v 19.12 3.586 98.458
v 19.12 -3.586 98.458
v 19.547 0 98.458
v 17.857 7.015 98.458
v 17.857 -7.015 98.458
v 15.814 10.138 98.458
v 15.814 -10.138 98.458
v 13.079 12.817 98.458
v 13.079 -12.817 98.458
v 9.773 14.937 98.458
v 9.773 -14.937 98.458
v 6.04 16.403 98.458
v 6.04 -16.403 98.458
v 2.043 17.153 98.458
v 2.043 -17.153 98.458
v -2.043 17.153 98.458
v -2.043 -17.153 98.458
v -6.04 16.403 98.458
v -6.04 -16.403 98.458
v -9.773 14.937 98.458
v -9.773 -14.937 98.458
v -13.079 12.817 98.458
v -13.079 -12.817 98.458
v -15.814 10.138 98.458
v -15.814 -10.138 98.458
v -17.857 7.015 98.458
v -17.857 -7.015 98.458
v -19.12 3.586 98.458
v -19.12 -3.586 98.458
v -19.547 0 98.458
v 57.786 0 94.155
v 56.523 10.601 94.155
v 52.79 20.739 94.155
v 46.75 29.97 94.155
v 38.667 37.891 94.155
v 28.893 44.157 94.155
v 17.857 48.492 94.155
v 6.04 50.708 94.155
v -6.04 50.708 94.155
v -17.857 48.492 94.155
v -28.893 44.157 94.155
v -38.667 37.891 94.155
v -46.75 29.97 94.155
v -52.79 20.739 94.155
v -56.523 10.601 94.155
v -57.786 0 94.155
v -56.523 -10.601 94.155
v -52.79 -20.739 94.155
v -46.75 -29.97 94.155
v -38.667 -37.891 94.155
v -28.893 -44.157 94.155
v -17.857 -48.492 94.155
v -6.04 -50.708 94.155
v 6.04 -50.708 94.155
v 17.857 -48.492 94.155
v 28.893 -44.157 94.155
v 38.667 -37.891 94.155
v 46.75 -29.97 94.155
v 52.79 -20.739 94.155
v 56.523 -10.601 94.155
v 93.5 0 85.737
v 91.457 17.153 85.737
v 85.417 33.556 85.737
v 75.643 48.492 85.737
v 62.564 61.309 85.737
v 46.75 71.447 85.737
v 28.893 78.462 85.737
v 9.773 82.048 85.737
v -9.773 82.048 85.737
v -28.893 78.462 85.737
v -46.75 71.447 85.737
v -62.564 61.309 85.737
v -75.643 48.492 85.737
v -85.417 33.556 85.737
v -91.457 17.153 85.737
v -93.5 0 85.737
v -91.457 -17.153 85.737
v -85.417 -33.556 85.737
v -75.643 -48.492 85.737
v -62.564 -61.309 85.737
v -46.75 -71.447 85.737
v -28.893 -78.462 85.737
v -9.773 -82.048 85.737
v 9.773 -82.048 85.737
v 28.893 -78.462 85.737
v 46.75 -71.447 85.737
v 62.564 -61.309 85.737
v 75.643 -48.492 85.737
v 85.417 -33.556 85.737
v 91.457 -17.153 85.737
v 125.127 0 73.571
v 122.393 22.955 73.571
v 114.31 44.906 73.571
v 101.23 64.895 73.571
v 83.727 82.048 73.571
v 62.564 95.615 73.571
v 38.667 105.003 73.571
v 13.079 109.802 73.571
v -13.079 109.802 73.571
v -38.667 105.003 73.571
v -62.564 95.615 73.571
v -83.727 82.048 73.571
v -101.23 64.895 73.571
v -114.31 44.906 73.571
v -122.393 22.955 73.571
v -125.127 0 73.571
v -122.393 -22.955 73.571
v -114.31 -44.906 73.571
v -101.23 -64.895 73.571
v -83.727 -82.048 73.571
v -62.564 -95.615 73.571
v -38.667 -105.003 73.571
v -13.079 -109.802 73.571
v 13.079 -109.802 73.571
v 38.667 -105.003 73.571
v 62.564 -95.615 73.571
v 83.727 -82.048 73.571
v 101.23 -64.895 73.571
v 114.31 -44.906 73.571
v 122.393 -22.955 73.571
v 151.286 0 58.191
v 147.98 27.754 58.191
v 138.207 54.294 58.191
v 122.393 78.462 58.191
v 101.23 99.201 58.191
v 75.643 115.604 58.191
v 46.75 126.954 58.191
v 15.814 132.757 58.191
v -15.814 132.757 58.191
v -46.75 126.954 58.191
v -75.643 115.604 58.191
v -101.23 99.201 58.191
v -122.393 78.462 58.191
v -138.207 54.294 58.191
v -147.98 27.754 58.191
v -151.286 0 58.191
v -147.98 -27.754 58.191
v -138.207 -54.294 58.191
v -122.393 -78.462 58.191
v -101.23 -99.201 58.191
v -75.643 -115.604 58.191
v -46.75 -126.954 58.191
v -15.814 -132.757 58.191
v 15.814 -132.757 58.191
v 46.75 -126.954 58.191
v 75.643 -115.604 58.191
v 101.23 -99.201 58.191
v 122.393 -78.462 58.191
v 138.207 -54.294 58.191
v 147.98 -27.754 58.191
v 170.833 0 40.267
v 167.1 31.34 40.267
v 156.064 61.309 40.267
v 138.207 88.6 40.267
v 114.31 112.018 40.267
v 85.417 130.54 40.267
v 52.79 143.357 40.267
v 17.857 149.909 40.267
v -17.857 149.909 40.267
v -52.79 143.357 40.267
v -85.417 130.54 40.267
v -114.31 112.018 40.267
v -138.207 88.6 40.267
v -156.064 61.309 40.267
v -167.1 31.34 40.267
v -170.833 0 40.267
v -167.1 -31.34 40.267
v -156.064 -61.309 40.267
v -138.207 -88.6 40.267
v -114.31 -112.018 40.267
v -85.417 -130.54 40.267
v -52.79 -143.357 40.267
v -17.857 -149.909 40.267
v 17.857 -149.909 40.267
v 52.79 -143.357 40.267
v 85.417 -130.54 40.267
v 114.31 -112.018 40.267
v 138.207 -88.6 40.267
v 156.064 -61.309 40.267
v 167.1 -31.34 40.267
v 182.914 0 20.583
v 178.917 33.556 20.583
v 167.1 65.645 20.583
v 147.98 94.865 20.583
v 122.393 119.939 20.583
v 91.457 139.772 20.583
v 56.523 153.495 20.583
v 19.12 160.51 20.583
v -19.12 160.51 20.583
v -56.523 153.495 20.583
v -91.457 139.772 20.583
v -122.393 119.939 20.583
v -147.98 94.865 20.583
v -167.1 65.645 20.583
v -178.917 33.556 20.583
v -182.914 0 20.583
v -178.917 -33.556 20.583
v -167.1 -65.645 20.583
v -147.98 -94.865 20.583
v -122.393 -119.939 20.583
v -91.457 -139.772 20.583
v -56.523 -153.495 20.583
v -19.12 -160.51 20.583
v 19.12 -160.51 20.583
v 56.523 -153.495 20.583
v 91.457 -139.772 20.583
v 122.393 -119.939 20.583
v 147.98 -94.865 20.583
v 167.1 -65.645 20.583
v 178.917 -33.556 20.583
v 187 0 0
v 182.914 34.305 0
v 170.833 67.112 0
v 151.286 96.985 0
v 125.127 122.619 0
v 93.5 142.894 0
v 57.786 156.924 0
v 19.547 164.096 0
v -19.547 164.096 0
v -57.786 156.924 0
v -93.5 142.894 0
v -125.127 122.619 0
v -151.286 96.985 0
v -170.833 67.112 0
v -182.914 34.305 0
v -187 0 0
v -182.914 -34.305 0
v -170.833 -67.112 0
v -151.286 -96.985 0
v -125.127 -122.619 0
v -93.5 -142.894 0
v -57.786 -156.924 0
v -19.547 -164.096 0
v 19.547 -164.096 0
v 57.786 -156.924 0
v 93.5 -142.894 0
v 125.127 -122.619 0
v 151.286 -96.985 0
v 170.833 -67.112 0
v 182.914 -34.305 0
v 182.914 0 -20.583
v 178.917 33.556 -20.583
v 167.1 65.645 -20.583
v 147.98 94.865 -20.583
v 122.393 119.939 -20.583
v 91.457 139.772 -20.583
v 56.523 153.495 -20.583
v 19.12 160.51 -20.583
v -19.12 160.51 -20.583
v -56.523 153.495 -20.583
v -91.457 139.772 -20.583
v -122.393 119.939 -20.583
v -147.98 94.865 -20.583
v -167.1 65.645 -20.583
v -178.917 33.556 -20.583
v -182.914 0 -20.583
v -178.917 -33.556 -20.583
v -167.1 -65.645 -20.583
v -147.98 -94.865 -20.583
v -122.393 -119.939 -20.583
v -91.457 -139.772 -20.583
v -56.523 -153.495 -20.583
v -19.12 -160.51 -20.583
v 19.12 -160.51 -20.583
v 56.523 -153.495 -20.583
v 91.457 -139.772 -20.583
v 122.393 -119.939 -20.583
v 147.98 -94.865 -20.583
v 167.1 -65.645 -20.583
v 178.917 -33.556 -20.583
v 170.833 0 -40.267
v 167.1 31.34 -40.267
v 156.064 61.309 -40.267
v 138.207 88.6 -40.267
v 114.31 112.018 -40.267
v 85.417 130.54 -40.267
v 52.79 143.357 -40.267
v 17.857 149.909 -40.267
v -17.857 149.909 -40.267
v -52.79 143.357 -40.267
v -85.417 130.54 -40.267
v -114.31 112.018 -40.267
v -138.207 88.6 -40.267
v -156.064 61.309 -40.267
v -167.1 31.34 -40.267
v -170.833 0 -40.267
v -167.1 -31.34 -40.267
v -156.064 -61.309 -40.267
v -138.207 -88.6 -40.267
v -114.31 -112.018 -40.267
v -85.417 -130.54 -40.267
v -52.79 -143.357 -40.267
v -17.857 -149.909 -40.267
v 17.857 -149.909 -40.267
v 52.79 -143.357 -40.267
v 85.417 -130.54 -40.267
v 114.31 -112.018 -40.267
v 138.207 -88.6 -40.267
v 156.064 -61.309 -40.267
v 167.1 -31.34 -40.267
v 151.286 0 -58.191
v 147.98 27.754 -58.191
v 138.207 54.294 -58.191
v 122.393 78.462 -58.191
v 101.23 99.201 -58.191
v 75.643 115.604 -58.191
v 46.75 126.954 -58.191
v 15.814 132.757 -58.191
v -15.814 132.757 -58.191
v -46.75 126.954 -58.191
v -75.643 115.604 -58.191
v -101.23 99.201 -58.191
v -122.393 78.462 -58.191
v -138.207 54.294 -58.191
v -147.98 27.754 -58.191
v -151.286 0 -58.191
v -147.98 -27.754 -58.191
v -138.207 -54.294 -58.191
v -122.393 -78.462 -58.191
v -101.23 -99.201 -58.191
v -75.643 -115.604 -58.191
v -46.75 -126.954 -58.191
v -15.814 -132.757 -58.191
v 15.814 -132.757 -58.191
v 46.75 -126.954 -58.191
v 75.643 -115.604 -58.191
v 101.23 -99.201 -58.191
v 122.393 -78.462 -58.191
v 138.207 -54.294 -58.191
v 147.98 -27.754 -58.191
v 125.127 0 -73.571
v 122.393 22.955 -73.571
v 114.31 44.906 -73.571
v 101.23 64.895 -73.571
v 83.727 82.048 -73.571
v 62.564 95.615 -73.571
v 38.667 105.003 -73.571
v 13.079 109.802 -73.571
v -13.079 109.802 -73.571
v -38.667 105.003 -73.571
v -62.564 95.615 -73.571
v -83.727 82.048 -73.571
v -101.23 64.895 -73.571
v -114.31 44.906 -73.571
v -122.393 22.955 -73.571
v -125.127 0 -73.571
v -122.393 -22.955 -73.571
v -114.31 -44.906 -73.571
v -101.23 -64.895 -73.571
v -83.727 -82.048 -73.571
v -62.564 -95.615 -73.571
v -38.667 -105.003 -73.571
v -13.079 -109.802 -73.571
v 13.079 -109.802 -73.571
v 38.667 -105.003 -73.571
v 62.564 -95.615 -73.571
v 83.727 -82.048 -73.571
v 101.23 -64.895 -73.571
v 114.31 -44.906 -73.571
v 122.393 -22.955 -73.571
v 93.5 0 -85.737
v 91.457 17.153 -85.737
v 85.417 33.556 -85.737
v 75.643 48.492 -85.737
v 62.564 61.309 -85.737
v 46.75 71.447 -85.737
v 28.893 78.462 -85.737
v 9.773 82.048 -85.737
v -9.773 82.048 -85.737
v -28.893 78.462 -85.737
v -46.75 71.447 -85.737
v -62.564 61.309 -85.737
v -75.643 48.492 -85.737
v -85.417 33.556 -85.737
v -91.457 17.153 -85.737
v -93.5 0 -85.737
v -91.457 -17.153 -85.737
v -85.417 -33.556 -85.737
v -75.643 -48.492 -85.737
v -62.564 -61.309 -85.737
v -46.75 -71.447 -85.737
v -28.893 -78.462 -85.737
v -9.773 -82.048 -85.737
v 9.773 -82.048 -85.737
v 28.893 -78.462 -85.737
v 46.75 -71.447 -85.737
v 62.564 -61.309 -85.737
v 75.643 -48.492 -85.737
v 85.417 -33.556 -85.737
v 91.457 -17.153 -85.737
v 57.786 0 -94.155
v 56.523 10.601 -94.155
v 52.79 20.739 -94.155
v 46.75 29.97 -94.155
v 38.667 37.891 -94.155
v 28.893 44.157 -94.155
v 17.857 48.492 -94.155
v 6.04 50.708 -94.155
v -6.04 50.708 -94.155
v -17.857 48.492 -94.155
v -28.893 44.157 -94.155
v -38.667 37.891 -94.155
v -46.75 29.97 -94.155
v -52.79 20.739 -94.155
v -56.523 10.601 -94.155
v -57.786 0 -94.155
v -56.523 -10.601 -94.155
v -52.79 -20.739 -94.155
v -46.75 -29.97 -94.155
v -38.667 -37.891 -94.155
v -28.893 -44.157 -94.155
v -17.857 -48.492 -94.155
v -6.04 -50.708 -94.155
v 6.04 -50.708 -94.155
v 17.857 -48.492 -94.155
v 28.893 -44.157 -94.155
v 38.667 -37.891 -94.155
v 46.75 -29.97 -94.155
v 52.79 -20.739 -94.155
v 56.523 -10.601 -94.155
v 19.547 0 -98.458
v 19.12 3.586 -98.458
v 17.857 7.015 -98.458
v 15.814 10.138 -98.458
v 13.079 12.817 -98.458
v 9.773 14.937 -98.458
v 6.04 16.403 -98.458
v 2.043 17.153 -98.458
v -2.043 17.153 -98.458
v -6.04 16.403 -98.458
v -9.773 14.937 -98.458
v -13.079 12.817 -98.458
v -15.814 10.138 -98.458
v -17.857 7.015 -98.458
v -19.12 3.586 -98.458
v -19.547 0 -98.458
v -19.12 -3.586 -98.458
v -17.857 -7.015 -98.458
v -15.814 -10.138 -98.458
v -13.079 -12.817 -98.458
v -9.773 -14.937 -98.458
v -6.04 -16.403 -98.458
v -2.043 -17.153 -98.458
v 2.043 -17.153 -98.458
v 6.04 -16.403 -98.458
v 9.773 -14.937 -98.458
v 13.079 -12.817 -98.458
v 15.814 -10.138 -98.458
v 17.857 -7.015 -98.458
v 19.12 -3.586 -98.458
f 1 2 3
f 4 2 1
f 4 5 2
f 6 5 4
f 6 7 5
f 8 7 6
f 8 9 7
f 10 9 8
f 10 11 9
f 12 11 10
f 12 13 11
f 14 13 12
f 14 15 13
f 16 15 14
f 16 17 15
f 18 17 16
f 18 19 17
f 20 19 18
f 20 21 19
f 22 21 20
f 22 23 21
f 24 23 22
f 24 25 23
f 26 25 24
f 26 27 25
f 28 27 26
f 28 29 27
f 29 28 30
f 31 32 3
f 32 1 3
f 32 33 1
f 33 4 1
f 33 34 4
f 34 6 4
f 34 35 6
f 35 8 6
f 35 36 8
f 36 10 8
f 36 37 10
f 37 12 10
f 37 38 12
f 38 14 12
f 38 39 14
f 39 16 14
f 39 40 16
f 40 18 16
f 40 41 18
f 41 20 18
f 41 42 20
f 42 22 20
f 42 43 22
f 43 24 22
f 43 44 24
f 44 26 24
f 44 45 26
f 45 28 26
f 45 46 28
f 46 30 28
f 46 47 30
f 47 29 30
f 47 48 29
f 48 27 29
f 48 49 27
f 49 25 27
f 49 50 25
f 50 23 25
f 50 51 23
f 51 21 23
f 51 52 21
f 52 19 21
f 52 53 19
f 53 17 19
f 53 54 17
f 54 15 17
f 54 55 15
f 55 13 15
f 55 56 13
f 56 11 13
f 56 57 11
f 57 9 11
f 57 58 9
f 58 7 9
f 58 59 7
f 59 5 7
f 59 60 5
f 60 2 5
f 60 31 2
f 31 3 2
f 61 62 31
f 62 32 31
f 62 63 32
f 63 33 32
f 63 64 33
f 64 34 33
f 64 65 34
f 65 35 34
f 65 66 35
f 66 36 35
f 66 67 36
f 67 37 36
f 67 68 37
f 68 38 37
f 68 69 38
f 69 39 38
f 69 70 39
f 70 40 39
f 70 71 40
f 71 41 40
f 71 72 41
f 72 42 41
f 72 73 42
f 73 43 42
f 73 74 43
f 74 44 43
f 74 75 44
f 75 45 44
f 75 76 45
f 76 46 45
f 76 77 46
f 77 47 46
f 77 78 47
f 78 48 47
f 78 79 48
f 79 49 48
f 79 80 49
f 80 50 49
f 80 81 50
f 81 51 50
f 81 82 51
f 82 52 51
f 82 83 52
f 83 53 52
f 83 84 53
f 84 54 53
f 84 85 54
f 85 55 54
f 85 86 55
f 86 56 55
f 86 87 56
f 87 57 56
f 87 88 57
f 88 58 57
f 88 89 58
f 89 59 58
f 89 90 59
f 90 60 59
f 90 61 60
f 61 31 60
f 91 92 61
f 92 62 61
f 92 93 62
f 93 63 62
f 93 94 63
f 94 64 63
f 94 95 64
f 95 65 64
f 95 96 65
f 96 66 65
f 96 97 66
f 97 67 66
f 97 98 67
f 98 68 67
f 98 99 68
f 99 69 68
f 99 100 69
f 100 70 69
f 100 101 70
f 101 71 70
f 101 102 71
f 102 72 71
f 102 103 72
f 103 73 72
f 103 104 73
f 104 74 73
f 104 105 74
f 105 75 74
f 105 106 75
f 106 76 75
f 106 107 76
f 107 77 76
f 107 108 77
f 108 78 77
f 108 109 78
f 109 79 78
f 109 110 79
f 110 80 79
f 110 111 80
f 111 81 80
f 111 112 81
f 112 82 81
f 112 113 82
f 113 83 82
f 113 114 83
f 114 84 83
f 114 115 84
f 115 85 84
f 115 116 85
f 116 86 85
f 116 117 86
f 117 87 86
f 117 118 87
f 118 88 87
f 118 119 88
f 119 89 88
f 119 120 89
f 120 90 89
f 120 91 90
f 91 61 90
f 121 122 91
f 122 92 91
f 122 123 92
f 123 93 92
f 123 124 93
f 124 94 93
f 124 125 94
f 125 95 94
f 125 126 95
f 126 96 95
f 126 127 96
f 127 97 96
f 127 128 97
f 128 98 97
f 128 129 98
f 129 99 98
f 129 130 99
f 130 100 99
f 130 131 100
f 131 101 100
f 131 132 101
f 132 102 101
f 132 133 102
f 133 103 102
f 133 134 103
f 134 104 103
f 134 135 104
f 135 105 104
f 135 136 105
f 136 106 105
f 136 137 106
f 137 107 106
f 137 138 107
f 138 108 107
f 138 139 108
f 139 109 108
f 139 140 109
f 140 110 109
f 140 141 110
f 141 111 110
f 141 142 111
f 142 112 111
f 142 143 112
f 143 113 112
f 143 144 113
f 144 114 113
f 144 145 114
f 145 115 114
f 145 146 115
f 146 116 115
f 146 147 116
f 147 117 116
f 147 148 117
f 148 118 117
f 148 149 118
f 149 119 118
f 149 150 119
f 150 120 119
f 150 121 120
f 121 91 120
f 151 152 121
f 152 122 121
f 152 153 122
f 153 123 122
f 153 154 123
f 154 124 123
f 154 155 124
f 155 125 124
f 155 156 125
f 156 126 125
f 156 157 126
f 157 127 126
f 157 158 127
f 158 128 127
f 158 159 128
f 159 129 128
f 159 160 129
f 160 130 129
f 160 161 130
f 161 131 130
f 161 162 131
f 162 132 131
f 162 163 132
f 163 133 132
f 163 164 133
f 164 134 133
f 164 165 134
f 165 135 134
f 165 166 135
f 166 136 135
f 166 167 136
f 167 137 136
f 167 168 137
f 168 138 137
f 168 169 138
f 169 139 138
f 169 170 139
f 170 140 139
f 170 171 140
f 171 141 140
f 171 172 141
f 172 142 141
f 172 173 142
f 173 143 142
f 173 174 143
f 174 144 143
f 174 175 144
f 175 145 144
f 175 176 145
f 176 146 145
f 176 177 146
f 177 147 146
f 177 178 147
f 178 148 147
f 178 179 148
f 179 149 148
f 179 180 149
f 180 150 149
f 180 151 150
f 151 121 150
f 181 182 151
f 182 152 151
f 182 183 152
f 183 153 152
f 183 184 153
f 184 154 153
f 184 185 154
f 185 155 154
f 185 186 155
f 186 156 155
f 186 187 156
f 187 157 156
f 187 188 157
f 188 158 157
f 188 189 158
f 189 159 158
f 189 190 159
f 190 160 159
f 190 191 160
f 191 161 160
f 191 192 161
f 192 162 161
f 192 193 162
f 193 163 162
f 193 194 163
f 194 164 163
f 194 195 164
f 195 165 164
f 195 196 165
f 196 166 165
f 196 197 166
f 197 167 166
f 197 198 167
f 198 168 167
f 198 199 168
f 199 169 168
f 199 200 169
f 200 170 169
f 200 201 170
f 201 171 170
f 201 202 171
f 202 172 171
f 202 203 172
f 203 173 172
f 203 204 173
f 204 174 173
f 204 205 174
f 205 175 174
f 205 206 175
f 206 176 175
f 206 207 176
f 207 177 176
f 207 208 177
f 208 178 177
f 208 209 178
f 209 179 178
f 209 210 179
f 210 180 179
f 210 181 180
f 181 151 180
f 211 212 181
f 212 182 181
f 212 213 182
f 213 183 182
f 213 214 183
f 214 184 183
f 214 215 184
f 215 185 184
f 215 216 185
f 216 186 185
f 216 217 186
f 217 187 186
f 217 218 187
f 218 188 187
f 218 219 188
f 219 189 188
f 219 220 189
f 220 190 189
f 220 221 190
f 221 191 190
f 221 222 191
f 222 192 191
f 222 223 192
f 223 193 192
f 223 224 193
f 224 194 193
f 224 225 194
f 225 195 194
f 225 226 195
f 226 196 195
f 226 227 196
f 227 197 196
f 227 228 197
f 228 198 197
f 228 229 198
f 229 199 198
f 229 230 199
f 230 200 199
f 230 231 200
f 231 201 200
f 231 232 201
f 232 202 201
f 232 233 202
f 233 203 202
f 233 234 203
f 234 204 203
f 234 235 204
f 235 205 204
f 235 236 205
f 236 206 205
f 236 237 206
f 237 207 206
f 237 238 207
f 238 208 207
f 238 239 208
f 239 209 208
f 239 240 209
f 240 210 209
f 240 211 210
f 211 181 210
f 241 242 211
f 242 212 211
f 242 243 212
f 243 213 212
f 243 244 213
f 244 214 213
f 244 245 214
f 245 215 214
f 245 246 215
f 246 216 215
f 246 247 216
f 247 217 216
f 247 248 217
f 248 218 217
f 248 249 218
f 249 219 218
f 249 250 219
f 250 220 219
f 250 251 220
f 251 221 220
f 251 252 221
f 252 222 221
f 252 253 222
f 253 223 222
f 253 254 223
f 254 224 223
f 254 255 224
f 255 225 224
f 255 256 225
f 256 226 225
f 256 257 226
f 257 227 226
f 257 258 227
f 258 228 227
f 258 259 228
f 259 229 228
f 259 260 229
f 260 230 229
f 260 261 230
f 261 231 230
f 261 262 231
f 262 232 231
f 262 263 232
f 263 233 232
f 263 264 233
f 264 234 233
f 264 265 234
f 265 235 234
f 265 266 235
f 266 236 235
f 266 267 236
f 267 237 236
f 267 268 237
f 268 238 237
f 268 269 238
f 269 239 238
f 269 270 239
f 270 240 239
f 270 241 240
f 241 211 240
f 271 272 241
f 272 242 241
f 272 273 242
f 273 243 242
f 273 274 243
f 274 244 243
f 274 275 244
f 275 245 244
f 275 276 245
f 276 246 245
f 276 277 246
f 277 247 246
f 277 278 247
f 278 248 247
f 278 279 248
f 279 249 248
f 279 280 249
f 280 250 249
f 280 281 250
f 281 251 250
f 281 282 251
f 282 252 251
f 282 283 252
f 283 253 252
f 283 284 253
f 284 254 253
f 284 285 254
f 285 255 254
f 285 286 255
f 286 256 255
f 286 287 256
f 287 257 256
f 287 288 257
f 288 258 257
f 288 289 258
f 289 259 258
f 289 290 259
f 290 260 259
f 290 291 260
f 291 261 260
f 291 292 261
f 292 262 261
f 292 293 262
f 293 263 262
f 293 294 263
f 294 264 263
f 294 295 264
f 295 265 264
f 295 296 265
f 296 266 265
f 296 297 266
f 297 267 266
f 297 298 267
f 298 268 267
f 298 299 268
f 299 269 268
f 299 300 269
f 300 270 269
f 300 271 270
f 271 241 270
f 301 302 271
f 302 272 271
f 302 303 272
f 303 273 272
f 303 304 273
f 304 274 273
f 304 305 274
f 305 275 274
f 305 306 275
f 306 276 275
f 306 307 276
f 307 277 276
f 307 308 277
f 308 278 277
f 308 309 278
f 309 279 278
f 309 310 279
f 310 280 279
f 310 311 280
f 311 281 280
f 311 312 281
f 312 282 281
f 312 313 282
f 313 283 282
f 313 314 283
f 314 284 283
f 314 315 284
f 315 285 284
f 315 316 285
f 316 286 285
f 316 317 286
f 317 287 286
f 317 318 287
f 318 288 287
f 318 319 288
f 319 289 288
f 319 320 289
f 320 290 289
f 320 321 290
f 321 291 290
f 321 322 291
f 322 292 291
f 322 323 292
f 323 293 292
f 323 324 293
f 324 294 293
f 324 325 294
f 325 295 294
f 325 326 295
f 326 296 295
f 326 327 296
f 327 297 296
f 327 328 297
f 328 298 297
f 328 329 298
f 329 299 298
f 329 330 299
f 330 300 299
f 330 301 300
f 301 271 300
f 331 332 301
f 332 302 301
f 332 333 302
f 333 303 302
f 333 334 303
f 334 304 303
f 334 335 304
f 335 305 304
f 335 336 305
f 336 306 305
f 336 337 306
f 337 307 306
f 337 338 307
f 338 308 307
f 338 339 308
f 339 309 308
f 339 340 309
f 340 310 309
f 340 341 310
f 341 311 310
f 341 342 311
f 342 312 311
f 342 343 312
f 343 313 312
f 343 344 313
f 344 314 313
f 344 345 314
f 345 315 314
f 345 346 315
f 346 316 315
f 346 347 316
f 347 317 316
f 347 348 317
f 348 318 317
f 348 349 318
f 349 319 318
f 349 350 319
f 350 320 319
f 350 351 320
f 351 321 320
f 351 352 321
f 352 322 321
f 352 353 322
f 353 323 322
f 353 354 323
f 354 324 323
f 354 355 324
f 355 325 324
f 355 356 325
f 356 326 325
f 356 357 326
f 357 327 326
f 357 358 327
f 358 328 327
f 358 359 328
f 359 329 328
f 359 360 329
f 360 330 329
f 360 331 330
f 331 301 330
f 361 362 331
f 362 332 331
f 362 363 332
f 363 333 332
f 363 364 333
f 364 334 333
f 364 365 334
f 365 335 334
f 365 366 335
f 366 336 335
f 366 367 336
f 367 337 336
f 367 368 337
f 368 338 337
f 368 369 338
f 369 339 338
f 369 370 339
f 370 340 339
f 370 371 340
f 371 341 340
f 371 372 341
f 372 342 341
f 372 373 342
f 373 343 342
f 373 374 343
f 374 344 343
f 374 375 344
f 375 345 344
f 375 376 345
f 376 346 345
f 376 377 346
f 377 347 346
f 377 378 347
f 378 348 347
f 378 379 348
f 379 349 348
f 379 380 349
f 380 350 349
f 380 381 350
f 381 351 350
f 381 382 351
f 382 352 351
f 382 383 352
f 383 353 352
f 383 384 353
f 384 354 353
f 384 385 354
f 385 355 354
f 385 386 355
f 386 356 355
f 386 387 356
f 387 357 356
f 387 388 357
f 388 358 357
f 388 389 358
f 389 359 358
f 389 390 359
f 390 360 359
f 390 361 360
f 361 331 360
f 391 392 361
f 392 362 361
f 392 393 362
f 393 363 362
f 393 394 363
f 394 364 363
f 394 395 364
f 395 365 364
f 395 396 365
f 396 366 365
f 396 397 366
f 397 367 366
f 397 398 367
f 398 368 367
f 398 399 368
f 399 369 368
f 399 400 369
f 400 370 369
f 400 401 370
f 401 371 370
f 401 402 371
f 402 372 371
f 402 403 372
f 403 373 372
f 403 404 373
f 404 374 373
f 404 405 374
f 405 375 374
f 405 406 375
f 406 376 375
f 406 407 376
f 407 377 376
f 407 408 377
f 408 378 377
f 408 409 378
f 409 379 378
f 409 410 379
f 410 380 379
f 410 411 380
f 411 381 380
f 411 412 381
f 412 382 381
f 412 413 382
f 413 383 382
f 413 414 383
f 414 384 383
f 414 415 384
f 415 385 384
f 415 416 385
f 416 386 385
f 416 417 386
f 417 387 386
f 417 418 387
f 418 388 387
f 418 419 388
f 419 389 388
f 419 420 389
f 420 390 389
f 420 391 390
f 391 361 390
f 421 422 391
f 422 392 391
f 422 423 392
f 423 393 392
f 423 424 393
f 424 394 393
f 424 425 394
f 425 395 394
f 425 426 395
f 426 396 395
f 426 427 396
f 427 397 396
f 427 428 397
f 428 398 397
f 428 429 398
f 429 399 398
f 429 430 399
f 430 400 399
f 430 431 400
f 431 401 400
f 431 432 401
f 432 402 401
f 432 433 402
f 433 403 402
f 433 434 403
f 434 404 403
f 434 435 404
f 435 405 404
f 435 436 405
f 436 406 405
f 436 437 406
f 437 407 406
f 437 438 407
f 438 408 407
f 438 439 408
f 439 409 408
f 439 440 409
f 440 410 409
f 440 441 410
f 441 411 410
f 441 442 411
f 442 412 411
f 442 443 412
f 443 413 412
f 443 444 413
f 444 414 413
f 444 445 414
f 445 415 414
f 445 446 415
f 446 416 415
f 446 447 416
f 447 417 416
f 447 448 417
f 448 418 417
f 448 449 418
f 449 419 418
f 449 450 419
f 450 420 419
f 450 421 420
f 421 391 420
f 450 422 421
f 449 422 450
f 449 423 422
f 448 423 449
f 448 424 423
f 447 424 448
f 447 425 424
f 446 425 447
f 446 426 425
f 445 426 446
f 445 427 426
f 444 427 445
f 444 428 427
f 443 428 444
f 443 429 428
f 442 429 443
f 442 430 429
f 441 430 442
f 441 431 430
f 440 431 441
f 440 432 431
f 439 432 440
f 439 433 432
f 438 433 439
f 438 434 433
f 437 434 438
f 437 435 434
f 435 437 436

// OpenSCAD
// Generated by SolidPython 1.0.1 on 2020-07-29 00:46:53


scale(v = [17, 15, 9]) {
	sphere(r = 11);
}
/***********************************************
*********      SolidPython code:      **********
************************************************
 
# import packages: SolidPython
from solid import *
from solid.utils import *
from itertools import chain, combinations, permutations


class Resize:

    def __init__(self, scad_file):
        self.scad_file = scad_file
        #self.scad_file = import_scad(scad_file)
        # cone/cylinder param:
        self.r1 = 0
        self.r2 = 0
        self.h = 0
        # rectangular prism param:
        self.w = 0
        self.l = 0
        # ellipse param:
        self.r = 0

    # import OpenScad code (file name corresponds to shape)


    # classify shape + parameters
    def assign(self, param1, param2, param3):
        if self.scad_file == 'cone.scad':
            self.r1 = param1
            self.r2 = param2
            self.h = param3
        elif self.scad_file == 'cylinder.scad':
            self.r1 = param1
            self.r2 = param2
            self.h = param3
        elif self.scad_file == 'rectangularPrism.scad':
            self.h = param1
            self.l = param2
            self.w = param3
        else:
            self.r = param1
            self.h = param2

    # resize parameters
    def iterate(self):
        x = range(3, 20, 2)
        i = 1
        if self.scad_file == 'cone.scad':
            tempList = list(permutations(x, 2))
            for temp in tempList:
                param1 = temp[0]
                param2 = temp[1]
                filepath = 'produced_scad_files/' + 'cone' + str(param1) + '_' + str(param2) + '_' + '.scad'
                scad_render_to_file(cylinder(h=param1, r1=param2, r2=0), filepath)

        elif self.scad_file == 'cylinder.scad':
            tempList = list(permutations(x, 3))
            for temp in tempList:
                param1 = temp[0]
                param2 = temp[1]
                filepath = 'produced_scad_files/' + 'cylinder' + str(param1) + '_' + str(param2) + '_' + '.scad'
                scad_render_to_file(cylinder(h=param1, r1=param2, r2=param2), filepath)

        elif self.scad_file == 'rectangularPrism.scad':
            tempList = list(permutations(x, 3))
            for temp in tempList:
                param1 = temp[0]
                param2 = temp[1]
                param3 = temp[2]
                filepath = 'produced_scad_files/' + 'rectangularPrism' + str(param1) + '_' + str(param2) + '_' + str(
                    param3) + '.scad'
                scad_render_to_file(cube(size=(param1, param2, param3)), filepath)

        elif self.scad_file == 'ellipse.scad':
            tempList = list(permutations(x, 4))
            for temp in tempList:
                param1 = temp[0]
                param2 = temp[1]
                param3 = temp[2]
                param4 = temp[3]
                filepath = 'produced_scad_files/' + 'ellipse' + str(param1) + '_' + str(param2) + '_' + str(param3) + '_' + str(param4) + '.scad'
                scad_render_to_file(scale([param1, param2, param3])(sphere(r=param4)), filepath)

    def render_to_scadfile(self):
        scad_render_to_file(scad, 'example.scad') 
 
************************************************/
